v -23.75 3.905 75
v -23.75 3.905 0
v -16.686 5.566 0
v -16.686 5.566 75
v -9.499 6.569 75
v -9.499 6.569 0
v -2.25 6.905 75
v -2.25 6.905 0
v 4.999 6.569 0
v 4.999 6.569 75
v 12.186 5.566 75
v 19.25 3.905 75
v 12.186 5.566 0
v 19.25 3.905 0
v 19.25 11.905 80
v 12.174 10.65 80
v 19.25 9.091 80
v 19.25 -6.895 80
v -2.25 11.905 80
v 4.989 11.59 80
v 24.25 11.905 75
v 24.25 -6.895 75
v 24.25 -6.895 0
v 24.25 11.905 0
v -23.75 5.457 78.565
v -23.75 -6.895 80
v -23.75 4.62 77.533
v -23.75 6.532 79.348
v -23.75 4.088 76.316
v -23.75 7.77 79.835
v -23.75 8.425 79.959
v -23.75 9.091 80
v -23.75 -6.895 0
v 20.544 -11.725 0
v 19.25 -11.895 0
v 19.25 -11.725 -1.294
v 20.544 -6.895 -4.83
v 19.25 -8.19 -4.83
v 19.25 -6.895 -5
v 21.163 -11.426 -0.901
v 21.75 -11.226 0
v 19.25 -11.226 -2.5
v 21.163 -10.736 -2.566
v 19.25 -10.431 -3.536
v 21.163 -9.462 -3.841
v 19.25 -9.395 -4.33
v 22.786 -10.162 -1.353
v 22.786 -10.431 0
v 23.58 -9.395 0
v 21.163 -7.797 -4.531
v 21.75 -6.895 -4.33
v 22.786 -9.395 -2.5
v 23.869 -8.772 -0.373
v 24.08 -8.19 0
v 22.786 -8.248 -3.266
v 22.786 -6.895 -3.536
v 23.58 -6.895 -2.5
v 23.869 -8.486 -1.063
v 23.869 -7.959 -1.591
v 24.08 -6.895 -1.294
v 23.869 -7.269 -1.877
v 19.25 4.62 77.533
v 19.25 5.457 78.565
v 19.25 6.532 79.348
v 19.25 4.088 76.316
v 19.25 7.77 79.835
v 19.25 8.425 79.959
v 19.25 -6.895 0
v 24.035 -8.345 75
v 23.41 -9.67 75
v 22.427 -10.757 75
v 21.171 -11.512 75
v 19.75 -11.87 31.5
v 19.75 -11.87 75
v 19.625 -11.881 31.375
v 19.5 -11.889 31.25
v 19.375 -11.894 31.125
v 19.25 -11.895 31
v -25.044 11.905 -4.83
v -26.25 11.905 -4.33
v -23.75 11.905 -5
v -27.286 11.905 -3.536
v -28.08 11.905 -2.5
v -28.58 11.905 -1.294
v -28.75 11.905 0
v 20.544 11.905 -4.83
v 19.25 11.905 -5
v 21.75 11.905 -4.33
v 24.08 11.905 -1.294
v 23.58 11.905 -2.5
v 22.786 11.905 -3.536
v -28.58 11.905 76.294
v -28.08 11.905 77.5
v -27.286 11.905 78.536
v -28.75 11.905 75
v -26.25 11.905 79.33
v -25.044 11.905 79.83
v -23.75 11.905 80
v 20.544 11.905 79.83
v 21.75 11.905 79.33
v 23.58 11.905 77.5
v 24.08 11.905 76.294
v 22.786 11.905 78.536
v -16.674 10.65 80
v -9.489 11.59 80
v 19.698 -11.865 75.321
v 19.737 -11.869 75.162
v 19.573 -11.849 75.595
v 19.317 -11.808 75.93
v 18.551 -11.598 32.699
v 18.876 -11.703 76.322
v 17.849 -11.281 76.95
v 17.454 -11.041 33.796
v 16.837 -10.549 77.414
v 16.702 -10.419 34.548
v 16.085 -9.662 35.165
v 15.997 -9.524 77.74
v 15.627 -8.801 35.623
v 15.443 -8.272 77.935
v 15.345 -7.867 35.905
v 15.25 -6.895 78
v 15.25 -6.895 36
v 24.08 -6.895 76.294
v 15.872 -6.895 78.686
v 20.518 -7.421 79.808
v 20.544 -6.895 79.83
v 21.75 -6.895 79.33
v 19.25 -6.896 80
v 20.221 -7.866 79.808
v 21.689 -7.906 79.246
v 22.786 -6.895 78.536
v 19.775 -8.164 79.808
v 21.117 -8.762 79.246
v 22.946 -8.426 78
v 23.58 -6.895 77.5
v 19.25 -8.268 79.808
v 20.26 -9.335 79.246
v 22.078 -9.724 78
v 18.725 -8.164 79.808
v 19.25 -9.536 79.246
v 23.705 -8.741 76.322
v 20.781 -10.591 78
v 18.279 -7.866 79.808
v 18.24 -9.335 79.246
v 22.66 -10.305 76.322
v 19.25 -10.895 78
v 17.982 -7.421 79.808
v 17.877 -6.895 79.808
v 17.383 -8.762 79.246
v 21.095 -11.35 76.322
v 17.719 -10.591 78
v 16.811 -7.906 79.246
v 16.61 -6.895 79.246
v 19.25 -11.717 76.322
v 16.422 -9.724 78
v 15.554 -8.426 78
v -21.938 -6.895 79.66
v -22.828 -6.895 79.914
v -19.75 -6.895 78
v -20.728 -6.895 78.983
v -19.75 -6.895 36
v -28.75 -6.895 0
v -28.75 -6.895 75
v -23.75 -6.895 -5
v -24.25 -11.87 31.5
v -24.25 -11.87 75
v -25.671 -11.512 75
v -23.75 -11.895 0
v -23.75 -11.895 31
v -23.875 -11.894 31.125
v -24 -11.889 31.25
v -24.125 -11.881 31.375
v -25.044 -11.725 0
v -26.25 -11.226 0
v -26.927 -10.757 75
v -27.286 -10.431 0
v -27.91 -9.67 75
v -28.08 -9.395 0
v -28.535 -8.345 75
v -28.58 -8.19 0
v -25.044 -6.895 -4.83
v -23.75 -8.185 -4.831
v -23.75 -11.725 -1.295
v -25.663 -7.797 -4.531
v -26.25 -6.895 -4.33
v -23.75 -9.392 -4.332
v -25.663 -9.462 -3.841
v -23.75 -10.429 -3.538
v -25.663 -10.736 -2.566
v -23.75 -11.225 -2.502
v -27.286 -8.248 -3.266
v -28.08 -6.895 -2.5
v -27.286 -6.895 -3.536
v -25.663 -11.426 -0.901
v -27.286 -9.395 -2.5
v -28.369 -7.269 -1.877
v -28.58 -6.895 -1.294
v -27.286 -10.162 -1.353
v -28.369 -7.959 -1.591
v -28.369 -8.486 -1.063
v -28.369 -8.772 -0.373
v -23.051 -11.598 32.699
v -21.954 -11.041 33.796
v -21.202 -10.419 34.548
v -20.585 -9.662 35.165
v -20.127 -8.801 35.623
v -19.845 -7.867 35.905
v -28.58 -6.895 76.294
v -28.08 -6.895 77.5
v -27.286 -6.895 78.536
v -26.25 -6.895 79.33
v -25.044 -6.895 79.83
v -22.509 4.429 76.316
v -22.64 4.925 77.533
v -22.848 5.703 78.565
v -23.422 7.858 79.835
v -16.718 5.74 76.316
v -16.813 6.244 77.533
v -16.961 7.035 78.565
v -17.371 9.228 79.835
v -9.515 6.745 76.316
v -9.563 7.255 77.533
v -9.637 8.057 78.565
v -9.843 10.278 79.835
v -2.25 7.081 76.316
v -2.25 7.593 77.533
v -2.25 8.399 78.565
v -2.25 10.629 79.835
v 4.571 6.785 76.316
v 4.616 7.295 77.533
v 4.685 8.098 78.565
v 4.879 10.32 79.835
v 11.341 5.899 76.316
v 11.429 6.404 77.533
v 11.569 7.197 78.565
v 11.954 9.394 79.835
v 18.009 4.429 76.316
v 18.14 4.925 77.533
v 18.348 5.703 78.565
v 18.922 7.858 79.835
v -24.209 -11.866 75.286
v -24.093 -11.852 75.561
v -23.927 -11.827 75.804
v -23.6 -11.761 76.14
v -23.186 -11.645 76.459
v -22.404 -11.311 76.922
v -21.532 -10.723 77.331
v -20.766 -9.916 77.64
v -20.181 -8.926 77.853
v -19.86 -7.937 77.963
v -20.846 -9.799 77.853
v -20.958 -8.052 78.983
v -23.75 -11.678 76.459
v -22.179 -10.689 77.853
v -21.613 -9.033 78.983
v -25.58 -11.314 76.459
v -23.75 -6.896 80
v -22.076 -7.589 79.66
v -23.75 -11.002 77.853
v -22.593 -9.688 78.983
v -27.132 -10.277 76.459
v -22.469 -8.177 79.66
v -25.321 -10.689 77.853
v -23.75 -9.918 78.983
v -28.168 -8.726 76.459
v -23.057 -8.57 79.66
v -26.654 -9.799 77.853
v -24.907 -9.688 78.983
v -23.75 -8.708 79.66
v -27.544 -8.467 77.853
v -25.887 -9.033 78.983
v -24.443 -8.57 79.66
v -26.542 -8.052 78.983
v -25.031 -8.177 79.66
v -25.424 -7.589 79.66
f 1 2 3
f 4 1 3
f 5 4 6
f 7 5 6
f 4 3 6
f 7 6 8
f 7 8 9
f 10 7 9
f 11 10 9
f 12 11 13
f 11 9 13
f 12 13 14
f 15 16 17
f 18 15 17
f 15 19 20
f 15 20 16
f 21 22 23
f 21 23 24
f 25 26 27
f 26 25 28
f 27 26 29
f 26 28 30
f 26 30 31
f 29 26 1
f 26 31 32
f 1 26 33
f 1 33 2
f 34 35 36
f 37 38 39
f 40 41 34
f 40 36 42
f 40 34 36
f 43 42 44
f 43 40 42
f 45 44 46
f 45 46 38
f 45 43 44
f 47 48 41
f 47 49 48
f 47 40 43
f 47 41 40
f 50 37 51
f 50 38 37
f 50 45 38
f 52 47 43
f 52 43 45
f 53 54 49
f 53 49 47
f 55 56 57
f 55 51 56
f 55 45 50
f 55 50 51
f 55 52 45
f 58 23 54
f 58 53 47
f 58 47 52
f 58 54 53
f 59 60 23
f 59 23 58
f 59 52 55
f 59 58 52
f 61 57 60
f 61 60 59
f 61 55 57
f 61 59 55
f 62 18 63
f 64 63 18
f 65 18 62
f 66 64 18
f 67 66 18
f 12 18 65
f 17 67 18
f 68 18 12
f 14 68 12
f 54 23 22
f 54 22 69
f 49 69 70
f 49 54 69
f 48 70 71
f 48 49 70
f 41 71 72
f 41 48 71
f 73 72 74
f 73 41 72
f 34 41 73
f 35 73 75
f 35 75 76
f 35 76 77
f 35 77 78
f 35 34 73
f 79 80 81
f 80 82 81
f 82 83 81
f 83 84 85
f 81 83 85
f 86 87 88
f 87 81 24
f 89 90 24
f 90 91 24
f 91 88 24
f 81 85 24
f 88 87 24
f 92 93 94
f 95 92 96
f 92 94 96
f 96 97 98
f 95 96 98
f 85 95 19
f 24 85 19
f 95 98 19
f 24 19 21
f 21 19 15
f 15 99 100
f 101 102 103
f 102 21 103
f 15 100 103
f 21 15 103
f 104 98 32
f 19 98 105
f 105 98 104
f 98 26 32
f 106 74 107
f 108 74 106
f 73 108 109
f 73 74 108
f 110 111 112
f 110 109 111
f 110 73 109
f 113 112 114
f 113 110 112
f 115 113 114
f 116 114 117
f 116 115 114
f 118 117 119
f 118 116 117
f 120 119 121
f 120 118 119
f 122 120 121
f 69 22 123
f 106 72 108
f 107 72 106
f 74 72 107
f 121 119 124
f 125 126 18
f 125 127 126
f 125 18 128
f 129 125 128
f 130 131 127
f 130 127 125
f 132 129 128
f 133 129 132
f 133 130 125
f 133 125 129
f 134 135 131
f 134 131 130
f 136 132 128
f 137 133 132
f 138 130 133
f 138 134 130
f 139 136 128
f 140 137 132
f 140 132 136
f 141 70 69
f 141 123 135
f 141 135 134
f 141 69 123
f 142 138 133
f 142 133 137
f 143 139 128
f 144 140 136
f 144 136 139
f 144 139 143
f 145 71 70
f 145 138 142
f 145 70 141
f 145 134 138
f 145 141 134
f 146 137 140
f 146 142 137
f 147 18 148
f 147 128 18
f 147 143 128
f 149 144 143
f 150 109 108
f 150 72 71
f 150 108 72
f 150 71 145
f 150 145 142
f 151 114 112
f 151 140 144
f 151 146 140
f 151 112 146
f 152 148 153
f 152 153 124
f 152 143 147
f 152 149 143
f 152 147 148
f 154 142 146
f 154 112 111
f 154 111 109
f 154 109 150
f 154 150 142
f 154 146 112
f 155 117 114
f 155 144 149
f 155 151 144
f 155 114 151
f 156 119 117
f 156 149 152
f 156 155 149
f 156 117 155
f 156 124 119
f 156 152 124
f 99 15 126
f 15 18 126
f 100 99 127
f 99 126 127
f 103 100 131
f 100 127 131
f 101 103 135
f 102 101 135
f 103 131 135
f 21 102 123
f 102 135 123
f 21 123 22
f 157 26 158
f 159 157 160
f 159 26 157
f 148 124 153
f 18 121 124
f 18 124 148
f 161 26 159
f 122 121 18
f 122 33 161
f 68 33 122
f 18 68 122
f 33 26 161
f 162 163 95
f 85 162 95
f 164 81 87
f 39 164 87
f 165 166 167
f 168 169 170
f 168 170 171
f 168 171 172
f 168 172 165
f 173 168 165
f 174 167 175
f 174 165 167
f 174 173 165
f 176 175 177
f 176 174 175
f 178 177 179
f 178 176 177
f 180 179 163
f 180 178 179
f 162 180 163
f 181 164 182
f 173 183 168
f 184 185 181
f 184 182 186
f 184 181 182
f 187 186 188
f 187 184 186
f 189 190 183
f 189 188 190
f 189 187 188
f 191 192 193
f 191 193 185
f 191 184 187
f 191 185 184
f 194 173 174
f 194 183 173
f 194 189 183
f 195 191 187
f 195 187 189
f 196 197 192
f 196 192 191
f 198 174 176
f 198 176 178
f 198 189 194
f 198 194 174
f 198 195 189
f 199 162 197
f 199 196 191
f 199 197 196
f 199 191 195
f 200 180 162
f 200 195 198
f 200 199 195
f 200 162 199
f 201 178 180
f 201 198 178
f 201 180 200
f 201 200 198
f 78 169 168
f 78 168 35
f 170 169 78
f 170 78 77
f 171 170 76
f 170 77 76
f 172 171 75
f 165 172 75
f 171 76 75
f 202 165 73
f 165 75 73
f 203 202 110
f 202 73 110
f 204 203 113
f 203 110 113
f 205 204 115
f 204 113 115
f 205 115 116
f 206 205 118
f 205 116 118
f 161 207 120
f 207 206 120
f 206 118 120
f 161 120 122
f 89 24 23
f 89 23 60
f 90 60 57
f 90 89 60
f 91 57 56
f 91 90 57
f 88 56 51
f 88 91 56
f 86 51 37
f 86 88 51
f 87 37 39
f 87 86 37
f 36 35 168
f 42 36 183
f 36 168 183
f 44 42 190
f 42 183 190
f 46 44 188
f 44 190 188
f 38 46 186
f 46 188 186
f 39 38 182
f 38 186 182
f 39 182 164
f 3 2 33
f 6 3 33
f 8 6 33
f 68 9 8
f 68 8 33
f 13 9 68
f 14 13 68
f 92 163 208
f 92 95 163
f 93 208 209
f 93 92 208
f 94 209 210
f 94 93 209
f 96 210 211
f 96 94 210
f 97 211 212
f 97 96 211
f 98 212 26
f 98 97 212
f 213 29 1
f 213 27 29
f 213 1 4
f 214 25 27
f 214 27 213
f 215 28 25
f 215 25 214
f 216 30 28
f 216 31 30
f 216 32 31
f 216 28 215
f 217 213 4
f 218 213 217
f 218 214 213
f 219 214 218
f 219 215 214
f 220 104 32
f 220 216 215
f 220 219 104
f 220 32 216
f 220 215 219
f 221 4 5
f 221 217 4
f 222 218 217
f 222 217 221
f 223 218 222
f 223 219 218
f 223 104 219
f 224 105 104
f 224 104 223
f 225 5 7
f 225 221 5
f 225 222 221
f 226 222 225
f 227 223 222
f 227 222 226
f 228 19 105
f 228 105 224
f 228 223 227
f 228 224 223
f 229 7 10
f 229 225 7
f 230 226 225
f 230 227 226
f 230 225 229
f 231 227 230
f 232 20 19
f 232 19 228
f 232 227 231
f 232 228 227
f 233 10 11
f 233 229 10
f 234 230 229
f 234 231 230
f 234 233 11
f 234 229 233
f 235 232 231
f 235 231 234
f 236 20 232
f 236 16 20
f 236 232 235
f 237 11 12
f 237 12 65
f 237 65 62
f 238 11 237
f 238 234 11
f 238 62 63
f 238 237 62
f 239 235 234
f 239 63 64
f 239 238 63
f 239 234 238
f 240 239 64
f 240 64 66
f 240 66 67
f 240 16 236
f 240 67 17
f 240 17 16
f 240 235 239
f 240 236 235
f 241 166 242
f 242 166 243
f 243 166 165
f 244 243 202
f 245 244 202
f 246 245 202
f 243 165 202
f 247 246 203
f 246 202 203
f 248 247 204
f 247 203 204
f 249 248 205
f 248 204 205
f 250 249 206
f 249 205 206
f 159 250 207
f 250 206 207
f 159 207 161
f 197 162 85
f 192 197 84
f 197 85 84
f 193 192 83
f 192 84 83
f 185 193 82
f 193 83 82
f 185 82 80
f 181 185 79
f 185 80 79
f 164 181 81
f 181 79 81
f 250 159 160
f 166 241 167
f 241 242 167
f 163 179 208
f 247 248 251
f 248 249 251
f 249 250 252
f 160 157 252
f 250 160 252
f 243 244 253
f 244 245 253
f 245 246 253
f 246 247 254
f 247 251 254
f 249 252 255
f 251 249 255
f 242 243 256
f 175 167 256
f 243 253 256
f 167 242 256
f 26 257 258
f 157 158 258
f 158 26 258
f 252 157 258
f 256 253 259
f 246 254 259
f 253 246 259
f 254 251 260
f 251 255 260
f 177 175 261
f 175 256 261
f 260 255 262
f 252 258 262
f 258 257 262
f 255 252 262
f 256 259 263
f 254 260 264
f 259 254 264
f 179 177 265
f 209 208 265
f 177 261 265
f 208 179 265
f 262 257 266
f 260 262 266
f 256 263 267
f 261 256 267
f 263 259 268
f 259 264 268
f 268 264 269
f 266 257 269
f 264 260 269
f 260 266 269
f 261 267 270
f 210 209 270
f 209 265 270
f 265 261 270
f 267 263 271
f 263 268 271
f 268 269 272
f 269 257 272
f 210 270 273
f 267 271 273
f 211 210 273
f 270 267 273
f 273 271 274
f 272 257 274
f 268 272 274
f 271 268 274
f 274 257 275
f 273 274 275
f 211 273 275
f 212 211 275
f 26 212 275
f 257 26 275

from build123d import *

# Parameters (mm, degrees)
F0_W         = 53
F0_H         = 23.8
F0_W_2       = 43
F0_H_2       = 13.8
F1_DEPTH     = 80
F2_DEPTH     = 5
F3_W         = 35
F3_H         = 44
F4_DEPTH     = 25
F5_T1_DEPTH  = 78
F5_T3_DEPTH  = 110
F5_T5_DEPTH  = 35
F5_T7_DEPTH  = 56.5
F5_T13_DEPTH = 69
F5_T17_DEPTH = 47.5
F5_T24_DEPTH = 47.5
F5_T28_DEPTH = 69
F6_T1_DEPTH  = 31.3
F6_S5_W      = 5
F6_S5_H      = 5
F6_T6_DEPTH  = 5
F6_S11_W     = 5
F6_S11_H     = 5
F6_T12_DEPTH = 5
F7_R         = 4.99999
F9_DEPTH     = 80
F10_T4_ANGLE = 50.0121835392


# Not quite as in the source:
# - a fillet or chamfer that OpenCascade refuses, or shapes differently, is made with other operations: its cross-section is extruded or revolved along the edge and cut away or added
# - a fillet or chamfer is up to 0.001 mm smaller than in the source, because OpenCascade refuses the exact size


with BuildPart() as f1:
    # F0 (on Top) → F1 (new body)
    with BuildSketch(Plane.XY):
        with Locations((-2.25, 0.0045082584)):
            Rectangle(F0_W, F0_H)
        with Locations((-2.25, 0.0045082584)):
            Rectangle(F0_W_2, F0_H_2, mode=Mode.SUBTRACT)
    extrude(amount=F1_DEPTH)

    # F0 (on Top) → F2 (join)
    with BuildSketch(Plane.XY):
        with Locations((-2.25, 0.0045082584)):
            Rectangle(F0_W, F0_H)
        with Locations((-2.25, 0.0045082584)):
            Rectangle(F0_W_2, F0_H_2, mode=Mode.SUBTRACT)
        with Locations((-2.25, 0.0045082584)):
            Rectangle(F0_W_2, F0_H_2)
    extrude(amount=-F2_DEPTH)

    # F3 (on face) → F4 (cut)
    with BuildSketch(Plane(origin=(0, -6.8954917416, 0), x_dir=(-1, 0, 0), z_dir=(0, 1, 0))):
        with Locations((2.25, 58)):
            Rectangle(F3_W, F3_H)
    extrude(amount=-F4_DEPTH, mode=Mode.SUBTRACT)

    # F5: fillet of radius 5 on 6 edges, made by hand

    # F5_s2 → F5_t1 (cut)
    with BuildSketch(Plane.YZ.offset(-41.25)):
        with BuildLine():
            ThreePointArc((-11.8954917416, 0), (-10.4310256475, -3.5355339059), (-6.8954917416, -5))
            Line((-6.8954917416, -5), (-11.8954917416, -5))
            Line((-11.8954917416, -5), (-11.8954917416, 0))
        make_face()
    extrude(amount=F5_T1_DEPTH, mode=Mode.SUBTRACT)

    # F5_s4 → F5_t3 (cut)
    with BuildSketch(Plane.XY.offset(-17.5)):
        with BuildLine():
            ThreePointArc((-23.75, -11.8954917416), (-27.2855339059, -10.4310256475), (-28.75, -6.8954917416))
            Line((-28.75, -6.8954917416), (-28.75, -11.8954917416))
            Line((-28.75, -11.8954917416), (-23.75, -11.8954917416))
        make_face()
        with BuildLine():
            ThreePointArc((24.25, -6.8954917416), (22.7855339059, -10.4310256475), (19.25, -11.8954917416))
            Line((19.25, -11.8954917416), (24.25, -11.8954917416))
            Line((24.25, -11.8954917416), (24.25, -6.8954917416))
        make_face()
    extrude(amount=F5_T3_DEPTH, mode=Mode.SUBTRACT)

    # F5_s6 → F5_t5 (cut)
    with BuildSketch(Plane.YZ.offset(-19.75)):
        with BuildLine():
            ThreePointArc((-11.8954917416, 31), (-10.4310256475, 34.5355339059), (-6.8954917416, 36))
            Line((-6.8954917416, 36), (-11.8954917416, 36))
            Line((-11.8954917416, 36), (-11.8954917416, 31))
        make_face()
    extrude(amount=F5_T5_DEPTH, mode=Mode.SUBTRACT)

    # F5_s8 → F5_t7 (cut)
    with BuildSketch(Plane.XY.offset(36)):
        with BuildLine():
            ThreePointArc((-24.75, -11.8954917416), (-21.2144660941, -10.4310256475), (-19.75, -6.8954917416))
            Line((-19.75, -6.8954917416), (-19.75, -11.8954917416))
            Line((-19.75, -11.8954917416), (-24.75, -11.8954917416))
        make_face()
        with BuildLine():
            ThreePointArc((20.25, -11.8954917416), (16.7144660941, -10.4310256475), (15.25, -6.8954917416))
            Line((15.25, -6.8954917416), (15.25, -11.8954917416))
            Line((15.25, -11.8954917416), (20.25, -11.8954917416))
        make_face()
    extrude(amount=F5_T7_DEPTH, mode=Mode.SUBTRACT)


with BuildPart() as f5_tool11:
    # F5_s12 → F5_t13 (new body)
    with BuildSketch(Plane.XY.offset(92.5)):
        with BuildLine():
            ThreePointArc((20.25, -11.8954917416), (16.7144660941, -10.4310256475), (15.25, -6.8954917416))
            Line((15.25, -6.8954917416), (15.25, -11.8954917416))
            Line((15.25, -11.8954917416), (20.25, -11.8954917416))
        make_face()
    extrude(amount=-F5_T13_DEPTH)

    split(bisect_by=Plane.XY.offset(36), keep=Keep.BOTTOM)


with BuildPart() as f5_tool15:
    # F5_s16 → F5_t17 (new body)
    with BuildSketch(Plane.YZ.offset(27.75)):
        with BuildLine():
            ThreePointArc((-11.8954917416, 31), (-10.4310256475, 34.5355339059), (-6.8954917416, 36))
            Line((-6.8954917416, 36), (-11.8954917416, 36))
            Line((-11.8954917416, 36), (-11.8954917416, 31))
        make_face()
    extrude(amount=-F5_T17_DEPTH)

    split(bisect_by=Plane.YZ.offset(15.25), keep=Keep.TOP)


with BuildPart() as f5_tool11_1:
    add(f5_tool11.part)

    # F5_t19: intersect F5_tool15
    add(f5_tool15.part, mode=Mode.INTERSECT)


with BuildPart() as f1_1:
    add(f1.part)

    # F5_t9: cut F5_tool11
    add(f5_tool11_1.part, mode=Mode.SUBTRACT)


with BuildPart() as f5_tool22:
    # F5_s23 → F5_t24 (new body)
    with BuildSketch(Plane.YZ.offset(15.25)):
        with BuildLine():
            ThreePointArc((-11.8954917416, 31), (-10.4310256475, 34.5355339059), (-6.8954917416, 36))
            Line((-6.8954917416, 36), (-11.8954917416, 36))
            Line((-11.8954917416, 36), (-11.8954917416, 31))
        make_face()
    extrude(amount=-F5_T24_DEPTH)

    split(bisect_by=Plane.YZ.offset(-19.75), keep=Keep.BOTTOM)


with BuildPart() as f5_tool26:
    # F5_s27 → F5_t28 (new body)
    with BuildSketch(Plane.XY.offset(23.5)):
        with BuildLine():
            ThreePointArc((-24.75, -11.8954917416), (-21.2144660941, -10.4310256475), (-19.75, -6.8954917416))
            Line((-19.75, -6.8954917416), (-19.75, -11.8954917416))
            Line((-19.75, -11.8954917416), (-24.75, -11.8954917416))
        make_face()
    extrude(amount=F5_T28_DEPTH)

    split(bisect_by=Plane.XY.offset(36), keep=Keep.BOTTOM)


with BuildPart() as f5_tool22_1:
    add(f5_tool22.part)

    # F5_t30: intersect F5_tool26
    add(f5_tool26.part, mode=Mode.INTERSECT)


with BuildPart() as f1_2:
    add(f1_1.part)

    # F5_t20: cut F5_tool22
    add(f5_tool22_1.part, mode=Mode.SUBTRACT)

    # F6: fillet of radius 5 on 2 edges, made by hand

    # F6_s2 → F6_t1 (cut)
    with BuildSketch(Plane.XZ.offset(-24.4045082584)):
        with BuildLine():
            ThreePointArc((24.25, 0), (22.7855339059, -3.5355339059), (19.25, -5))
            Line((19.25, -5), (24.25, -5))
            Line((24.25, -5), (24.25, 0))
        make_face()
        with BuildLine():
            ThreePointArc((-28.75, 0), (-27.2855339059, -3.5355339059), (-23.75, -5))
            Line((-23.75, -5), (-28.75, -5))
            Line((-28.75, -5), (-28.75, 0))
        make_face()
    extrude(amount=F6_T1_DEPTH, mode=Mode.SUBTRACT)


with BuildPart() as f6_tool4:
    # F6_s5 → F6_t6 (new body)
    with BuildSketch(Plane.YZ.offset(-23.75)):
        with Locations((-9.3954917416, -2.5)):
            Rectangle(F6_S5_W, F6_S5_H)
    extrude(amount=-F6_T6_DEPTH)

    # F6_s7 → F6_t8 (revolve, cut)
    with BuildSketch(Plane(origin=(-23.75, -6.8954917416, 0), x_dir=(0, 0.7071067812, 0.7071067812), z_dir=(0, -0.7071067812, 0.7071067812))):
        with BuildLine():
            ThreePointArc((0, -5), (5, 0), (0, 5))
            Line((0, 5), (0, -5))
        make_face()
    revolve(axis=Axis((-23.75, -6.8954917416, 0), (-1, 0, 0)), mode=Mode.SUBTRACT)


with BuildPart() as f1_3:
    add(f1_2.part)

    # F6_t3: cut F6_tool4
    add(f6_tool4.part, mode=Mode.SUBTRACT)


with BuildPart() as f6_tool10:
    # F6_s11 → F6_t12 (new body)
    with BuildSketch(Plane.YZ.offset(19.25)):
        with Locations((-9.3954917416, -2.5)):
            Rectangle(F6_S11_W, F6_S11_H)
    extrude(amount=F6_T12_DEPTH)

    # F6_s13 → F6_t14 (revolve, cut)
    with BuildSketch(Plane(origin=(19.25, -6.8954917416, 0), x_dir=(0, 0.7071067812, 0.7071067812), z_dir=(0, 0.7071067812, -0.7071067812))):
        with BuildLine():
            ThreePointArc((0, -5), (5, 0), (0, 5))
            Line((0, 5), (0, -5))
        make_face()
    revolve(axis=Axis((19.25, -6.8954917416, 0), (1, 0, 0)), mode=Mode.SUBTRACT)


with BuildPart() as f1_4:
    add(f1_3.part)

    # F6_t9: cut F6_tool10
    add(f6_tool10.part, mode=Mode.SUBTRACT)

    # F7 (radius 5 in the source; OpenCascade refuses exactly that, so slightly less here)
    f7_edges = [f1_4.edges().sort_by_distance(p)[0] for p in [
        (22.958099, -10.249594, 80),
        (-28.75, 2.504508, 80),
    ]]
    fillet(f7_edges, radius=F7_R)

    # F8 (on face) → F9 (join)
    with BuildSketch(Plane.XY):
        with BuildLine():
            ThreePointArc((-2.25, 6.9045082584), (8.604146673, 6.1508927486), (19.25, 3.9045082584))
            Line((19.25, 3.9045082584), (19.25, 6.9045082584))
            Line((19.25, 6.9045082584), (-2.25, 6.9045082584))
        make_face()
        with BuildLine():
            ThreePointArc((-23.75, 3.9045082584), (-13.104146673, 6.1508927486), (-2.25, 6.9045082584))
            Line((-2.25, 6.9045082584), (-23.75, 6.9045082584))
            Line((-23.75, 6.9045082584), (-23.75, 3.9045082584))
        make_face()
    extrude(amount=F9_DEPTH)

    # F10: fillet of radius 5 on 1 edges, made by hand


with BuildPart() as f10_tool2:
    # F10_s3 → F10_t4 (revolve)
    with BuildSketch(Plane(origin=(-29.2914715623, -13.6626291921, 0), x_dir=(0, 0, 1), z_dir=(-0.9062628485, -0.4227146193, 0))):
        with BuildLine():
            ThreePointArc((75, 14.5706793202), (78.5355339059, 16.0351454142), (80, 19.5706793202))
            Line((80, 19.5706793202), (80, 14.5706793202))
            Line((80, 14.5706793202), (75, 14.5706793202))
        make_face()
    revolve(axis=Axis((-2.25, -71.6371584083, 80), (0, 0, -1)), revolution_arc=F10_T4_ANGLE)

    split(bisect_by=Plane.YZ.offset(19.25), keep=Keep.BOTTOM)

    split(bisect_by=Plane.YZ.offset(-23.75), keep=Keep.TOP)


with BuildPart() as f1_5:
    add(f1_4.part)

    # F10_t1: cut F10_tool2
    add(f10_tool2.part, mode=Mode.SUBTRACT)


solid = f1_5.part
